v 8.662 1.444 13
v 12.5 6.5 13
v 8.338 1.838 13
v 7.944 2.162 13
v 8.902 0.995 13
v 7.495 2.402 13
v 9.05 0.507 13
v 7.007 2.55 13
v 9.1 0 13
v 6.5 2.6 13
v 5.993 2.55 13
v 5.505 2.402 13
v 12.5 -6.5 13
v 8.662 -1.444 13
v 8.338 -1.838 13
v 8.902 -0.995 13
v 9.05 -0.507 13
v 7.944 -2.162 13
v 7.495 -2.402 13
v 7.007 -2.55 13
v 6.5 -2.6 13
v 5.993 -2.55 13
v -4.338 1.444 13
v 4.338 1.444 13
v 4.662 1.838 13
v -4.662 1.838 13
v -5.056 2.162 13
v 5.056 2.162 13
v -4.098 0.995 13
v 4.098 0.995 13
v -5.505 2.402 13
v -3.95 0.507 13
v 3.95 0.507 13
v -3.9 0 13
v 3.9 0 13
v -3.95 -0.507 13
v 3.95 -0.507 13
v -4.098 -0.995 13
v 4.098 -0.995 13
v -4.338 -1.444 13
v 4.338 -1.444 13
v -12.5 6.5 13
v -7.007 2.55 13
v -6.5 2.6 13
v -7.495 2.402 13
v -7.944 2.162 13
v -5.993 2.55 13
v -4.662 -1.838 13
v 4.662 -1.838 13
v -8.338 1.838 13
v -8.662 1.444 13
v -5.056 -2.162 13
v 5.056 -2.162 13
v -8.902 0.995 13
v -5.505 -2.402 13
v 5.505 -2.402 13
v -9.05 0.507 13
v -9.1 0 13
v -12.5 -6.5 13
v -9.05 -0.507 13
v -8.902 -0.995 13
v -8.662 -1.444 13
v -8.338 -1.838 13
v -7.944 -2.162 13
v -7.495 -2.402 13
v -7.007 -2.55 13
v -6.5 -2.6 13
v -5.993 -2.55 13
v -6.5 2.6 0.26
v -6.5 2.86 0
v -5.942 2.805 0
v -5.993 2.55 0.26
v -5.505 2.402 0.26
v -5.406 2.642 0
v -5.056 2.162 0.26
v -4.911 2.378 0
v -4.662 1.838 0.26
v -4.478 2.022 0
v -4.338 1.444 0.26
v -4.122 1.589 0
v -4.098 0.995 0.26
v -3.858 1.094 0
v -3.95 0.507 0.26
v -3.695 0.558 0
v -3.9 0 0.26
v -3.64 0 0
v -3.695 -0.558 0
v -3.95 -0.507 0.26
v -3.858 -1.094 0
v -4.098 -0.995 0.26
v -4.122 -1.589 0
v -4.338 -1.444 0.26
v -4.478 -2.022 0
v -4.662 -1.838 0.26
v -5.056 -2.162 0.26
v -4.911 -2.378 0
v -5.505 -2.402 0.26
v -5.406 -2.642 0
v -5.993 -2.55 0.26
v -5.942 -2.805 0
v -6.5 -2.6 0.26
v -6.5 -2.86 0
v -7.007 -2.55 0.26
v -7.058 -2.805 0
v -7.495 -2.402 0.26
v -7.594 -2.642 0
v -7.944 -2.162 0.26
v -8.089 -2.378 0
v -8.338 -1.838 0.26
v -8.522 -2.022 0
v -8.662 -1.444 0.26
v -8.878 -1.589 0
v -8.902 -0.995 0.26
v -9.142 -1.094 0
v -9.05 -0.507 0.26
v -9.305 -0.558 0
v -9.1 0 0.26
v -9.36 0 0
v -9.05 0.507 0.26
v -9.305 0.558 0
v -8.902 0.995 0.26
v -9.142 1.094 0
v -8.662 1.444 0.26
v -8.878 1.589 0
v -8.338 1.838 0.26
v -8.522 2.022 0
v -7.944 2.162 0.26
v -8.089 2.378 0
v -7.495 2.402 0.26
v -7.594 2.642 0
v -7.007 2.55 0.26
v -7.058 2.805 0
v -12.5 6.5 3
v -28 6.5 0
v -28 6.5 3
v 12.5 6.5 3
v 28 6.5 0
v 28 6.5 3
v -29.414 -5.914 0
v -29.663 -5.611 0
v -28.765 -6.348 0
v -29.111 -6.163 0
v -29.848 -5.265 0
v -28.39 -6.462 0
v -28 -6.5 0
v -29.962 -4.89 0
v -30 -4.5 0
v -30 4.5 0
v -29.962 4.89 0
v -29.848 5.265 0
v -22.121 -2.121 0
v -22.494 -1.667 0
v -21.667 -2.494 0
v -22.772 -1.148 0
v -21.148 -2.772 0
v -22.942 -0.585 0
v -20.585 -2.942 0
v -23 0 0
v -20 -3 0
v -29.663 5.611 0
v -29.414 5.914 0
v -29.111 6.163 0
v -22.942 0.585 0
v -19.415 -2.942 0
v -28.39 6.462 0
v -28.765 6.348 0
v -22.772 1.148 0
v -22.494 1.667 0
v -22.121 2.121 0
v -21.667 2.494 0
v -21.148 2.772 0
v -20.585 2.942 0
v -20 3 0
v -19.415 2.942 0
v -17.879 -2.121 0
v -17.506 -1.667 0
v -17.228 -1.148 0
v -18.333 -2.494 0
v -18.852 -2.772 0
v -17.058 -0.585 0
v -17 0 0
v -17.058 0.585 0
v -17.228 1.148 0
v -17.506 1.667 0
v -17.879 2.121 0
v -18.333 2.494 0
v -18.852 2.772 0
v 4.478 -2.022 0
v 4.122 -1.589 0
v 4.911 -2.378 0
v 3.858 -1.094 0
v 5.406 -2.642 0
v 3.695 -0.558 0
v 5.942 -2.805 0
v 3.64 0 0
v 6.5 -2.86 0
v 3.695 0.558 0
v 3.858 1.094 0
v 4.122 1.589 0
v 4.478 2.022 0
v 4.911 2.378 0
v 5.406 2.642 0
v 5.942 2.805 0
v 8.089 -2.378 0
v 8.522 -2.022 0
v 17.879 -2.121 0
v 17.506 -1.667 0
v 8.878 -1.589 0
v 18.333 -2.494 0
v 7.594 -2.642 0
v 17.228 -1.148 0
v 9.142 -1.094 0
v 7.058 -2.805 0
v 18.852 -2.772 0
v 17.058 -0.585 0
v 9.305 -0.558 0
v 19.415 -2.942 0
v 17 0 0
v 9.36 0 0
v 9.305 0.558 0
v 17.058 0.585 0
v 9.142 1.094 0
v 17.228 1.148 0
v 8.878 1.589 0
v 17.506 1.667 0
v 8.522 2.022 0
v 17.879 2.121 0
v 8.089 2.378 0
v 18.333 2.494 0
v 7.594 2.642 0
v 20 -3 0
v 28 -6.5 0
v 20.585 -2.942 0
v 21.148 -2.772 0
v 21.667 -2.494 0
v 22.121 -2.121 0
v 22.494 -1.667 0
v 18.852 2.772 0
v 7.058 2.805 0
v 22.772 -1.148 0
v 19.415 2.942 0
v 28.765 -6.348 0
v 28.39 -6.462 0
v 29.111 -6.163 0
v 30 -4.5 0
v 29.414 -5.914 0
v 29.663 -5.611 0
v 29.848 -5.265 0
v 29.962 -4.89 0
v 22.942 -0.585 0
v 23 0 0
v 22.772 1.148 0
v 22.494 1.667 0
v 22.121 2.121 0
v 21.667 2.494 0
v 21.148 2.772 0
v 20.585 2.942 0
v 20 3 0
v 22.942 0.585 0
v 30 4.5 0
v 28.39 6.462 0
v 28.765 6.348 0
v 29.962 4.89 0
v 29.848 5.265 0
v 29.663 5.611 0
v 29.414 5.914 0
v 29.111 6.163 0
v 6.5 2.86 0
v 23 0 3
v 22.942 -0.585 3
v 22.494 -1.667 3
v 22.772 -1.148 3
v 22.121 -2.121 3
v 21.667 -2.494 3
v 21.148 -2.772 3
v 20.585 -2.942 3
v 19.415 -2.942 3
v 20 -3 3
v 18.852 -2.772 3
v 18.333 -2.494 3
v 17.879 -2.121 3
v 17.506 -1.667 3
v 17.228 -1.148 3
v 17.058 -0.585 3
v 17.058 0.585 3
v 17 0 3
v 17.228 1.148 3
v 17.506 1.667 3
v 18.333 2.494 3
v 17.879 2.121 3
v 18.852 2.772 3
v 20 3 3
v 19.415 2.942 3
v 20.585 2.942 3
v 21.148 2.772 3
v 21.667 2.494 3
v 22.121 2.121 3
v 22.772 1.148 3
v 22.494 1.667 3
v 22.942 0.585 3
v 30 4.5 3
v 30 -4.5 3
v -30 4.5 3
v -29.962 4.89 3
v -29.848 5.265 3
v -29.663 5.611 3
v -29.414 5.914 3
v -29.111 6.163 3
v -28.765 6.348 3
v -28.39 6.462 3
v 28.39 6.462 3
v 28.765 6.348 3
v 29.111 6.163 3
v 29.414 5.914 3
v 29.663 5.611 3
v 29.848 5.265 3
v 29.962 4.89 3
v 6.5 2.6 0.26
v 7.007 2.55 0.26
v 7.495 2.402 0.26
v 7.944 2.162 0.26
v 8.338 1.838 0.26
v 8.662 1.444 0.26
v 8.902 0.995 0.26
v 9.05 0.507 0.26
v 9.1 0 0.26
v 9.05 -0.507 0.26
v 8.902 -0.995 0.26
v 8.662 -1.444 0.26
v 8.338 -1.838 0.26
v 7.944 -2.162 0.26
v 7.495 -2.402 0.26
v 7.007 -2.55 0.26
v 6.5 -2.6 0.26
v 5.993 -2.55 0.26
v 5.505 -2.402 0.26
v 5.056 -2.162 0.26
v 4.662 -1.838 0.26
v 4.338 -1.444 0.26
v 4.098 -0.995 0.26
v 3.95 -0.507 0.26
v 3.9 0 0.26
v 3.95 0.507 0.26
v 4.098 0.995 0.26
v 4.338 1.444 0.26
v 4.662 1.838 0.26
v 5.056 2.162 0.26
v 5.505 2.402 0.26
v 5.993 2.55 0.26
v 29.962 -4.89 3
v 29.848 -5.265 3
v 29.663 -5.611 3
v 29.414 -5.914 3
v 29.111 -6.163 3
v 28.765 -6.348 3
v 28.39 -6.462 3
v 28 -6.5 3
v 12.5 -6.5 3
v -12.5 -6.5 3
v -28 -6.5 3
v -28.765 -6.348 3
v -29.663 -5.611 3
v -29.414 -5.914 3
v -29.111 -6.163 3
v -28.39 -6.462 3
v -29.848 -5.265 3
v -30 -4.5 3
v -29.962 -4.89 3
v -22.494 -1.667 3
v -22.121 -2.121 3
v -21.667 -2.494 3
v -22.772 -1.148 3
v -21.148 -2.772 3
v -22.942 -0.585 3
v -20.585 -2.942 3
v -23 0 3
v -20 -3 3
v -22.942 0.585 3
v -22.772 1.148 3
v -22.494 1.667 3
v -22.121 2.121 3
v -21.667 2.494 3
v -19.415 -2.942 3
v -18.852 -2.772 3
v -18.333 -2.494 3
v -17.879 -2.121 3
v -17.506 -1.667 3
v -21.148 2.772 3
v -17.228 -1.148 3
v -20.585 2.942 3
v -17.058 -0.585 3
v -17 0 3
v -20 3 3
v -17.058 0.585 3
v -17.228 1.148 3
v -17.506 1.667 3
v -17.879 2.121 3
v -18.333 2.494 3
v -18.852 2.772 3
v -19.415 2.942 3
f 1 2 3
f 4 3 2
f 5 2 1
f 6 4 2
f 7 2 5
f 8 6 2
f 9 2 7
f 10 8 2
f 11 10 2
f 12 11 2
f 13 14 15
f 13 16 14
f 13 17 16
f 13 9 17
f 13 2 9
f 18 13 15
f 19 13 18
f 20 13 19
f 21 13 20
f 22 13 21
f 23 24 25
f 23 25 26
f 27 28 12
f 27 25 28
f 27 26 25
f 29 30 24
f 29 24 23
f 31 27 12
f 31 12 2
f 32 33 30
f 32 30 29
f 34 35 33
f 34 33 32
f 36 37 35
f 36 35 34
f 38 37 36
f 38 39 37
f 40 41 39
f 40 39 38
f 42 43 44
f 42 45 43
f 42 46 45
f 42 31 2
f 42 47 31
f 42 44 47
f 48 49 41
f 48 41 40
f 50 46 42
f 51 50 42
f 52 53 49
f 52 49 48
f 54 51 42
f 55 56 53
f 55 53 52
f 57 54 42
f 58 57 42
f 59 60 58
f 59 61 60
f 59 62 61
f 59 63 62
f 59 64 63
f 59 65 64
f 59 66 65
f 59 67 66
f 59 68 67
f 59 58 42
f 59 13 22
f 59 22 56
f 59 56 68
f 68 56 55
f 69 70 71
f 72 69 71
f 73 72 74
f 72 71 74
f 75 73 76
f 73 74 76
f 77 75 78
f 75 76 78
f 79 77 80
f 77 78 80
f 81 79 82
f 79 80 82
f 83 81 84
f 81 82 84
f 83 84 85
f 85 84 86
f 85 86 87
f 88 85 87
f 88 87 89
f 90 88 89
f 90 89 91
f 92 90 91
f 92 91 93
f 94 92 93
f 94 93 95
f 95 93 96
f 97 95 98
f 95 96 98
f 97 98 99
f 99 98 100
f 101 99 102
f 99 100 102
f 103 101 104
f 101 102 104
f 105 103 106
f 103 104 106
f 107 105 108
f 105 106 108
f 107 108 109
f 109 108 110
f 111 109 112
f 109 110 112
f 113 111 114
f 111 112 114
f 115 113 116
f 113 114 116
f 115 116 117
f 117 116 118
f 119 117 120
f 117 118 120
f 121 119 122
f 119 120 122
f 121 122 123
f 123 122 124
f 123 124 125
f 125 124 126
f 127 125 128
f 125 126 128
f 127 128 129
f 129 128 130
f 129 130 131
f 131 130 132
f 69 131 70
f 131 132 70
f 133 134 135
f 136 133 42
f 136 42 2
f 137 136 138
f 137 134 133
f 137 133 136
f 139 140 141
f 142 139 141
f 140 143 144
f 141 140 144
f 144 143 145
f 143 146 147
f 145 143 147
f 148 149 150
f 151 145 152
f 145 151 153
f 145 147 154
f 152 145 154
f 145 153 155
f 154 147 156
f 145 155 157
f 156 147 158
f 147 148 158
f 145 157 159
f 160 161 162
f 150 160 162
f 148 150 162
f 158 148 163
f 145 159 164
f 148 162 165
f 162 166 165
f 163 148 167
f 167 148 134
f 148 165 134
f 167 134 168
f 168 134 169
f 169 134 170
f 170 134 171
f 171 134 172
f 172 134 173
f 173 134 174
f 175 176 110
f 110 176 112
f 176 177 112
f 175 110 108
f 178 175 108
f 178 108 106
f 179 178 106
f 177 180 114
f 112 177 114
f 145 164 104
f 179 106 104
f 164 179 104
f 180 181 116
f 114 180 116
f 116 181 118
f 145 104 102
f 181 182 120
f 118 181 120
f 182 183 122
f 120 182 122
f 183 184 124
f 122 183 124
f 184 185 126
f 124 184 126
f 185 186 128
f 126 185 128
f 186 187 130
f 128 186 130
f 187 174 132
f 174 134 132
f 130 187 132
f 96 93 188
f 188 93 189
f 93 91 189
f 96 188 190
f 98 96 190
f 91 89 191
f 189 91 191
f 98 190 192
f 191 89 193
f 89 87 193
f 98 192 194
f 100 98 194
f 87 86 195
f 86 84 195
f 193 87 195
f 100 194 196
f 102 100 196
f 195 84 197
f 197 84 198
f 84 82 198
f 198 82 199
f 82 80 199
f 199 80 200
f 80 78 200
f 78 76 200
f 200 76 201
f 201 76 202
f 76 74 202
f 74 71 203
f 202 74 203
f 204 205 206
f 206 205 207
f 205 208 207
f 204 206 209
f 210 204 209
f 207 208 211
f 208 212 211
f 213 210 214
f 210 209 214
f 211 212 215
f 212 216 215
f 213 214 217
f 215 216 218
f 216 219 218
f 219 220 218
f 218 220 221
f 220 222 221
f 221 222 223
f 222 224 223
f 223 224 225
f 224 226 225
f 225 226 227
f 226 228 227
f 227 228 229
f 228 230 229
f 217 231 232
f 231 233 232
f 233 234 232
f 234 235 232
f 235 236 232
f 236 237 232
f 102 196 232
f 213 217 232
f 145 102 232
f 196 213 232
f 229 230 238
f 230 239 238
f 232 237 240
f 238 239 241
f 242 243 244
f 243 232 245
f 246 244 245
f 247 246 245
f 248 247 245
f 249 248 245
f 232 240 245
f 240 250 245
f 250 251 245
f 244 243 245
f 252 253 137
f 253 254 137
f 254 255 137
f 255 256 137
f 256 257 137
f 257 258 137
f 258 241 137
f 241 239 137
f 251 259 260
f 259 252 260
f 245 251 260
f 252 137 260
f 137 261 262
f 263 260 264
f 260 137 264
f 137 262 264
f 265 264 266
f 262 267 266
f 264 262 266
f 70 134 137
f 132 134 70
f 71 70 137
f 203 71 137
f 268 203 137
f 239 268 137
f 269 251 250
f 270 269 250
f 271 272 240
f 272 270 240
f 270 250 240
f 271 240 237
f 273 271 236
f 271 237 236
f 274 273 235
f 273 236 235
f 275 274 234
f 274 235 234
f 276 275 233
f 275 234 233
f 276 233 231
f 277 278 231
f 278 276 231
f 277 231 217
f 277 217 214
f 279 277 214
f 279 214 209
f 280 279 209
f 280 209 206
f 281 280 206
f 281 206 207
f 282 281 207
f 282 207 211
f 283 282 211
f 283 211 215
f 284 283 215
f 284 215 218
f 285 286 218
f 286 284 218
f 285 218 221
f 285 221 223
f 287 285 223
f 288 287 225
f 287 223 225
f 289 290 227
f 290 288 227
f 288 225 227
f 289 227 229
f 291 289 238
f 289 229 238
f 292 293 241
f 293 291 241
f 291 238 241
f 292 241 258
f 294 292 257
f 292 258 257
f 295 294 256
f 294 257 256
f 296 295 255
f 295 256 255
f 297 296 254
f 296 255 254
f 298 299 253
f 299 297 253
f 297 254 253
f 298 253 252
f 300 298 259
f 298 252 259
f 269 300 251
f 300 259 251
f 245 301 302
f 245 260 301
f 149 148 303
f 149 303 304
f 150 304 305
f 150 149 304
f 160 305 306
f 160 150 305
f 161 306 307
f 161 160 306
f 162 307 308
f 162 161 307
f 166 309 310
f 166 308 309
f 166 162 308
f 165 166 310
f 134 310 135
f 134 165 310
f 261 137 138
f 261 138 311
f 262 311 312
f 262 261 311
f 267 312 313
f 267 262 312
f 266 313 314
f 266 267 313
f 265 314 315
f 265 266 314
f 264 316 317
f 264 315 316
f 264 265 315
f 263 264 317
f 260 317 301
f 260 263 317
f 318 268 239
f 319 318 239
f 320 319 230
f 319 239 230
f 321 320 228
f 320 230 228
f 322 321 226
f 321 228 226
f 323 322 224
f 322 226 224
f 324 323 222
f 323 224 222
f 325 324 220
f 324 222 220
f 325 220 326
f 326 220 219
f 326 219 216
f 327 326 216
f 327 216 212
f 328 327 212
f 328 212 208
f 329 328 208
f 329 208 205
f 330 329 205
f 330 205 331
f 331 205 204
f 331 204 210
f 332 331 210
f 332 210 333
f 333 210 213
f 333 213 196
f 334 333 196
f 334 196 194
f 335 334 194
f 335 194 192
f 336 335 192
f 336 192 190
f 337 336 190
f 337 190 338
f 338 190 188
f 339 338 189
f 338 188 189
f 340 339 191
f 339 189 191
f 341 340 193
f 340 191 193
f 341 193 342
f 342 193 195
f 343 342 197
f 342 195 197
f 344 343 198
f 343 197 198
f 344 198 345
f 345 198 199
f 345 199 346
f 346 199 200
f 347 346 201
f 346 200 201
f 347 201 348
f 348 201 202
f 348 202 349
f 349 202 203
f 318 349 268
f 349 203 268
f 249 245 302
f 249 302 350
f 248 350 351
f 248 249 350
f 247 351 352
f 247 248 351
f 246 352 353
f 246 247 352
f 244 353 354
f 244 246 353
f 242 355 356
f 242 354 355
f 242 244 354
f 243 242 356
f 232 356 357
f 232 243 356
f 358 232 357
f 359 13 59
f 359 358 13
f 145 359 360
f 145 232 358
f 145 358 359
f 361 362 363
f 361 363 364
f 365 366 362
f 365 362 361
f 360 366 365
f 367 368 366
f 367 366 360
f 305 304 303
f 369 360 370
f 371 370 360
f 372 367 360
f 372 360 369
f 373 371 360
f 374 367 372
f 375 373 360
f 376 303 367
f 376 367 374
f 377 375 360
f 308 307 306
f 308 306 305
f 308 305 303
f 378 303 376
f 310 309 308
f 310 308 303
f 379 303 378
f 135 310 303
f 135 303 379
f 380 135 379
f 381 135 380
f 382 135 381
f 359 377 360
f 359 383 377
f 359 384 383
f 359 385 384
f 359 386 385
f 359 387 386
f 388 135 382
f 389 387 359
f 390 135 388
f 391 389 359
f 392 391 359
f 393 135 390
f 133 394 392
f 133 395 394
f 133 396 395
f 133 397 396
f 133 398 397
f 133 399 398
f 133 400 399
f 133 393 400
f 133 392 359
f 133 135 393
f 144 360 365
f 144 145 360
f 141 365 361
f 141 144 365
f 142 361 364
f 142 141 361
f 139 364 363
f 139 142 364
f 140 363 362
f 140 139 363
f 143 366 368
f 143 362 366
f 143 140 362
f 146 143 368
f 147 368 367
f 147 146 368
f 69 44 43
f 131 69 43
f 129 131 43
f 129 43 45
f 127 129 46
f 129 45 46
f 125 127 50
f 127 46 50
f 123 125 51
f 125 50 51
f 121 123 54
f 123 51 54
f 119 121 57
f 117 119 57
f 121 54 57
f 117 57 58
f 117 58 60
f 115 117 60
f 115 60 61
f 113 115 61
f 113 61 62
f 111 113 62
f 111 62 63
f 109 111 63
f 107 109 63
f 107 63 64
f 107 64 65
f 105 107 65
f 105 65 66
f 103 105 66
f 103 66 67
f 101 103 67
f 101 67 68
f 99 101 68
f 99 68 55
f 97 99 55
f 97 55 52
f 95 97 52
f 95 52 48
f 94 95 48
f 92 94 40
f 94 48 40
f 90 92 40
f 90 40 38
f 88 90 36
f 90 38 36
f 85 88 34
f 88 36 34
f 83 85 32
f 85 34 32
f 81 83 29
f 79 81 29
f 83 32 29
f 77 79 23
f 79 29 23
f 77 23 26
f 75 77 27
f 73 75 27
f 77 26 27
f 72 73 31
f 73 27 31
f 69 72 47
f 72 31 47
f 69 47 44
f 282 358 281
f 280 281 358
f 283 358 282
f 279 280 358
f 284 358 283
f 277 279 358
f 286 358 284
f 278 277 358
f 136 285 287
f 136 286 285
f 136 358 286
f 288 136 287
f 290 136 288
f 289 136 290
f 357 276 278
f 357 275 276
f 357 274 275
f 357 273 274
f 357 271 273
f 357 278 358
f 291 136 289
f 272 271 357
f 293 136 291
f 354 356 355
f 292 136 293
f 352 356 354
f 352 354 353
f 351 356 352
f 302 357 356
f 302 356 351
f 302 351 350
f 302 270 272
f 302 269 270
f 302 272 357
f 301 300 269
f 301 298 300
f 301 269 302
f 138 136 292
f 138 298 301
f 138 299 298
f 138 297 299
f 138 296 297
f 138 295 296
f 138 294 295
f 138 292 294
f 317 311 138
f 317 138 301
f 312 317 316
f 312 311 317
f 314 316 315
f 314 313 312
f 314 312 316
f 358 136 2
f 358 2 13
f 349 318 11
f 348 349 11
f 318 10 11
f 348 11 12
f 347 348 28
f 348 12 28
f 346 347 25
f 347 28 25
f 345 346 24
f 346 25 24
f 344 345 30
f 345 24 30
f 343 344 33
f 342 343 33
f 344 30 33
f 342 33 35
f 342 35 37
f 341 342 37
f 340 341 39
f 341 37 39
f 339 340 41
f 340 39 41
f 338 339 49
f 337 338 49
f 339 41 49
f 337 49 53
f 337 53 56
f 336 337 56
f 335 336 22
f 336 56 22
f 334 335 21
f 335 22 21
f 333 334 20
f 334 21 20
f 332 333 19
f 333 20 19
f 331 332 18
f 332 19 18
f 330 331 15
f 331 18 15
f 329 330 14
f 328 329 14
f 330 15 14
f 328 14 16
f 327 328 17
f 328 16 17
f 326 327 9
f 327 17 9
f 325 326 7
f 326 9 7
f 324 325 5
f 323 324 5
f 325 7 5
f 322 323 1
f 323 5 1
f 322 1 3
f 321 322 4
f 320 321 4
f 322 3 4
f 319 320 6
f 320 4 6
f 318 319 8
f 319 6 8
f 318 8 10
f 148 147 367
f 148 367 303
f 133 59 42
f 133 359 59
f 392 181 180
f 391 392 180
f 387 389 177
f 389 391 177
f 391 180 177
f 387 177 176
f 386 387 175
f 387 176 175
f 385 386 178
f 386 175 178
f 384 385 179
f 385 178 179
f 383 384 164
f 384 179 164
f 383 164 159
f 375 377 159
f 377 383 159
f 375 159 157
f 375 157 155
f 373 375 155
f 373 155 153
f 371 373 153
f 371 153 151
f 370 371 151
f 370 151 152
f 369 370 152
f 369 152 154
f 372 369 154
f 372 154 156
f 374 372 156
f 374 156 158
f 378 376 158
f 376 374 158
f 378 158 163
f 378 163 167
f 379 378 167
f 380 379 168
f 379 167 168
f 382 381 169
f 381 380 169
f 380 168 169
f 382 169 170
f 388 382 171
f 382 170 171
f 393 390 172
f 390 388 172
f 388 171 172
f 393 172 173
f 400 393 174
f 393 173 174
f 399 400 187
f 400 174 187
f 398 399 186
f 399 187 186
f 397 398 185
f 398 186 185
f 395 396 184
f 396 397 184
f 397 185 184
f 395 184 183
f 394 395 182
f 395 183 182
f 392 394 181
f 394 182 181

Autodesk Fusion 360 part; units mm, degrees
sketch "Sketch1" plane through (0, 0, 0) normal (0, 0, 1) x (1, 0, 0)
  line L0 (28, -6.5) -> (-28, -6.5)
  line L1 (-30, -4.5) -> (-30, 4.5)
  line L2 (-28, 6.5) -> (28, 6.5)
  line L3 (30, 4.5) -> (30, -4.5)
  line L4 (30, -6.5) -> (-30, 6.5) construction
  line L5 (-30, -6.5) -> (30, 6.5) construction
  line L6 (0, 0) -> (20, 0) construction
  line L7 (0, 0) -> (-20, 0) construction
  arc A0 (30, 4.5) -> (28, 6.5) centre (28, 4.5) ccw
  arc A1 (28, -6.5) -> (30, -4.5) centre (28, -4.5) ccw
  arc A2 (-30, -4.5) -> (-28, -6.5) centre (-28, -4.5) ccw
  arc A3 (-28, 6.5) -> (-30, 4.5) centre (-28, 4.5) ccw
  circle A4 centre (20, 0) radius 3
  circle A5 centre (-20, 0) radius 3
  dimension "d1" = 60
  dimension "d2" = 13
  dimension "d3" = 20
  dimension "d4" = 2
  dimension "d5" = 20
  dimension "d6" = 6
  dimension "d7" = 6
extrude "Extrude1" add sketch "Sketch1" along normal blind 3
sketch "Sketch2" plane through (0, 0, 3) normal (0, 0, 1) x (-1, 0, 0)
  circle A0 centre (-20, 0) radius 3
  circle A1 centre (20, 0) radius 3
  arc A2 (-30, -4.5) -> (-28, -6.5) centre (-28, -4.5) ccw
  line L0 (-28, -6.5) -> (28, -6.5)
  arc A3 (28, -6.5) -> (30, -4.5) centre (28, -4.5) ccw
  line L1 (30, -4.5) -> (30, 4.5)
  arc A4 (30, 4.5) -> (28, 6.5) centre (28, 4.5) ccw
  line L2 (28, 6.5) -> (-28, 6.5)
  arc A5 (-28, 6.5) -> (-30, 4.5) centre (-28, 4.5) ccw
  line L3 (-30, 4.5) -> (-30, -4.5)
  line L4 (-12.5, 6.5) -> (12.5, 6.5)
  line L5 (12.5, 6.5) -> (12.5, -6.5)
  line L6 (12.5, -6.5) -> (-12.5, -6.5)
  line L7 (-12.5, -6.5) -> (-12.5, 6.5)
  line L8 (-12.5, 6.5) -> (12.5, -6.5) construction
  line L9 (12.5, 6.5) -> (-12.5, -6.5) construction
  line L10 (0, 0) -> (-6.5, 0) construction
  line L11 (0, 0) -> (6.5, 0) construction
  dimension "d10" = 25
  dimension "d11" = 6.5
  dimension "d12" = 6.5
extrude "Extrude2" add sketch "Sketch2" along normal blind 10 contours L0 L2 L4 L5 L6 L7
sketch "Sketch3" plane through (0, 0, 0) normal (0, 0, 1) x (-1, 0, 0)
  line L0 (-12.5, -6.5) -> (12.5, -6.5)
  line L1 (12.5, -6.5) -> (12.5, 6.5)
  line L2 (12.5, 6.5) -> (-12.5, 6.5)
  line L3 (-12.5, 6.5) -> (-12.5, -6.5)
  line L4 (0, 0) -> (-6.5, 0) construction
  line L5 (0, 0) -> (6.5, 0) construction
  circle A0 centre (-6.5, 0) radius 2.6
  line L6 (0, 0) -> (0, -2) construction
  circle A1 centre (6.5, 0) radius 2.6
  circle A2 centre (-20, 0) radius 3
  circle A3 centre (20, 0) radius 3
  arc A4 (-30, -4.5) -> (-28, -6.5) centre (-28, -4.5) ccw
  line L7 (-30, -4.5) -> (-30, 4.5)
  arc A5 (-28, 6.5) -> (-30, 4.5) centre (-28, 4.5) ccw
  line L8 (-28, 6.5) -> (28, 6.5)
  arc A6 (30, 4.5) -> (28, 6.5) centre (28, 4.5) ccw
  line L9 (30, 4.5) -> (30, -4.5)
  arc A7 (28, -6.5) -> (30, -4.5) centre (28, -4.5) ccw
  line L10 (28, -6.5) -> (-28, -6.5)
  dimension "d15" = 6.5
  dimension "d16" = 6.5
  dimension "d17" = 5.2
  dimension "d18" = 2
hole "Hole1" at (6.5, 0, 0) at (-6.5, 0, 0) direction (0, 0, 1) diameter 5.2 depth 13 tip angle 90 countersink diameter 5.72 countersink angle 90
